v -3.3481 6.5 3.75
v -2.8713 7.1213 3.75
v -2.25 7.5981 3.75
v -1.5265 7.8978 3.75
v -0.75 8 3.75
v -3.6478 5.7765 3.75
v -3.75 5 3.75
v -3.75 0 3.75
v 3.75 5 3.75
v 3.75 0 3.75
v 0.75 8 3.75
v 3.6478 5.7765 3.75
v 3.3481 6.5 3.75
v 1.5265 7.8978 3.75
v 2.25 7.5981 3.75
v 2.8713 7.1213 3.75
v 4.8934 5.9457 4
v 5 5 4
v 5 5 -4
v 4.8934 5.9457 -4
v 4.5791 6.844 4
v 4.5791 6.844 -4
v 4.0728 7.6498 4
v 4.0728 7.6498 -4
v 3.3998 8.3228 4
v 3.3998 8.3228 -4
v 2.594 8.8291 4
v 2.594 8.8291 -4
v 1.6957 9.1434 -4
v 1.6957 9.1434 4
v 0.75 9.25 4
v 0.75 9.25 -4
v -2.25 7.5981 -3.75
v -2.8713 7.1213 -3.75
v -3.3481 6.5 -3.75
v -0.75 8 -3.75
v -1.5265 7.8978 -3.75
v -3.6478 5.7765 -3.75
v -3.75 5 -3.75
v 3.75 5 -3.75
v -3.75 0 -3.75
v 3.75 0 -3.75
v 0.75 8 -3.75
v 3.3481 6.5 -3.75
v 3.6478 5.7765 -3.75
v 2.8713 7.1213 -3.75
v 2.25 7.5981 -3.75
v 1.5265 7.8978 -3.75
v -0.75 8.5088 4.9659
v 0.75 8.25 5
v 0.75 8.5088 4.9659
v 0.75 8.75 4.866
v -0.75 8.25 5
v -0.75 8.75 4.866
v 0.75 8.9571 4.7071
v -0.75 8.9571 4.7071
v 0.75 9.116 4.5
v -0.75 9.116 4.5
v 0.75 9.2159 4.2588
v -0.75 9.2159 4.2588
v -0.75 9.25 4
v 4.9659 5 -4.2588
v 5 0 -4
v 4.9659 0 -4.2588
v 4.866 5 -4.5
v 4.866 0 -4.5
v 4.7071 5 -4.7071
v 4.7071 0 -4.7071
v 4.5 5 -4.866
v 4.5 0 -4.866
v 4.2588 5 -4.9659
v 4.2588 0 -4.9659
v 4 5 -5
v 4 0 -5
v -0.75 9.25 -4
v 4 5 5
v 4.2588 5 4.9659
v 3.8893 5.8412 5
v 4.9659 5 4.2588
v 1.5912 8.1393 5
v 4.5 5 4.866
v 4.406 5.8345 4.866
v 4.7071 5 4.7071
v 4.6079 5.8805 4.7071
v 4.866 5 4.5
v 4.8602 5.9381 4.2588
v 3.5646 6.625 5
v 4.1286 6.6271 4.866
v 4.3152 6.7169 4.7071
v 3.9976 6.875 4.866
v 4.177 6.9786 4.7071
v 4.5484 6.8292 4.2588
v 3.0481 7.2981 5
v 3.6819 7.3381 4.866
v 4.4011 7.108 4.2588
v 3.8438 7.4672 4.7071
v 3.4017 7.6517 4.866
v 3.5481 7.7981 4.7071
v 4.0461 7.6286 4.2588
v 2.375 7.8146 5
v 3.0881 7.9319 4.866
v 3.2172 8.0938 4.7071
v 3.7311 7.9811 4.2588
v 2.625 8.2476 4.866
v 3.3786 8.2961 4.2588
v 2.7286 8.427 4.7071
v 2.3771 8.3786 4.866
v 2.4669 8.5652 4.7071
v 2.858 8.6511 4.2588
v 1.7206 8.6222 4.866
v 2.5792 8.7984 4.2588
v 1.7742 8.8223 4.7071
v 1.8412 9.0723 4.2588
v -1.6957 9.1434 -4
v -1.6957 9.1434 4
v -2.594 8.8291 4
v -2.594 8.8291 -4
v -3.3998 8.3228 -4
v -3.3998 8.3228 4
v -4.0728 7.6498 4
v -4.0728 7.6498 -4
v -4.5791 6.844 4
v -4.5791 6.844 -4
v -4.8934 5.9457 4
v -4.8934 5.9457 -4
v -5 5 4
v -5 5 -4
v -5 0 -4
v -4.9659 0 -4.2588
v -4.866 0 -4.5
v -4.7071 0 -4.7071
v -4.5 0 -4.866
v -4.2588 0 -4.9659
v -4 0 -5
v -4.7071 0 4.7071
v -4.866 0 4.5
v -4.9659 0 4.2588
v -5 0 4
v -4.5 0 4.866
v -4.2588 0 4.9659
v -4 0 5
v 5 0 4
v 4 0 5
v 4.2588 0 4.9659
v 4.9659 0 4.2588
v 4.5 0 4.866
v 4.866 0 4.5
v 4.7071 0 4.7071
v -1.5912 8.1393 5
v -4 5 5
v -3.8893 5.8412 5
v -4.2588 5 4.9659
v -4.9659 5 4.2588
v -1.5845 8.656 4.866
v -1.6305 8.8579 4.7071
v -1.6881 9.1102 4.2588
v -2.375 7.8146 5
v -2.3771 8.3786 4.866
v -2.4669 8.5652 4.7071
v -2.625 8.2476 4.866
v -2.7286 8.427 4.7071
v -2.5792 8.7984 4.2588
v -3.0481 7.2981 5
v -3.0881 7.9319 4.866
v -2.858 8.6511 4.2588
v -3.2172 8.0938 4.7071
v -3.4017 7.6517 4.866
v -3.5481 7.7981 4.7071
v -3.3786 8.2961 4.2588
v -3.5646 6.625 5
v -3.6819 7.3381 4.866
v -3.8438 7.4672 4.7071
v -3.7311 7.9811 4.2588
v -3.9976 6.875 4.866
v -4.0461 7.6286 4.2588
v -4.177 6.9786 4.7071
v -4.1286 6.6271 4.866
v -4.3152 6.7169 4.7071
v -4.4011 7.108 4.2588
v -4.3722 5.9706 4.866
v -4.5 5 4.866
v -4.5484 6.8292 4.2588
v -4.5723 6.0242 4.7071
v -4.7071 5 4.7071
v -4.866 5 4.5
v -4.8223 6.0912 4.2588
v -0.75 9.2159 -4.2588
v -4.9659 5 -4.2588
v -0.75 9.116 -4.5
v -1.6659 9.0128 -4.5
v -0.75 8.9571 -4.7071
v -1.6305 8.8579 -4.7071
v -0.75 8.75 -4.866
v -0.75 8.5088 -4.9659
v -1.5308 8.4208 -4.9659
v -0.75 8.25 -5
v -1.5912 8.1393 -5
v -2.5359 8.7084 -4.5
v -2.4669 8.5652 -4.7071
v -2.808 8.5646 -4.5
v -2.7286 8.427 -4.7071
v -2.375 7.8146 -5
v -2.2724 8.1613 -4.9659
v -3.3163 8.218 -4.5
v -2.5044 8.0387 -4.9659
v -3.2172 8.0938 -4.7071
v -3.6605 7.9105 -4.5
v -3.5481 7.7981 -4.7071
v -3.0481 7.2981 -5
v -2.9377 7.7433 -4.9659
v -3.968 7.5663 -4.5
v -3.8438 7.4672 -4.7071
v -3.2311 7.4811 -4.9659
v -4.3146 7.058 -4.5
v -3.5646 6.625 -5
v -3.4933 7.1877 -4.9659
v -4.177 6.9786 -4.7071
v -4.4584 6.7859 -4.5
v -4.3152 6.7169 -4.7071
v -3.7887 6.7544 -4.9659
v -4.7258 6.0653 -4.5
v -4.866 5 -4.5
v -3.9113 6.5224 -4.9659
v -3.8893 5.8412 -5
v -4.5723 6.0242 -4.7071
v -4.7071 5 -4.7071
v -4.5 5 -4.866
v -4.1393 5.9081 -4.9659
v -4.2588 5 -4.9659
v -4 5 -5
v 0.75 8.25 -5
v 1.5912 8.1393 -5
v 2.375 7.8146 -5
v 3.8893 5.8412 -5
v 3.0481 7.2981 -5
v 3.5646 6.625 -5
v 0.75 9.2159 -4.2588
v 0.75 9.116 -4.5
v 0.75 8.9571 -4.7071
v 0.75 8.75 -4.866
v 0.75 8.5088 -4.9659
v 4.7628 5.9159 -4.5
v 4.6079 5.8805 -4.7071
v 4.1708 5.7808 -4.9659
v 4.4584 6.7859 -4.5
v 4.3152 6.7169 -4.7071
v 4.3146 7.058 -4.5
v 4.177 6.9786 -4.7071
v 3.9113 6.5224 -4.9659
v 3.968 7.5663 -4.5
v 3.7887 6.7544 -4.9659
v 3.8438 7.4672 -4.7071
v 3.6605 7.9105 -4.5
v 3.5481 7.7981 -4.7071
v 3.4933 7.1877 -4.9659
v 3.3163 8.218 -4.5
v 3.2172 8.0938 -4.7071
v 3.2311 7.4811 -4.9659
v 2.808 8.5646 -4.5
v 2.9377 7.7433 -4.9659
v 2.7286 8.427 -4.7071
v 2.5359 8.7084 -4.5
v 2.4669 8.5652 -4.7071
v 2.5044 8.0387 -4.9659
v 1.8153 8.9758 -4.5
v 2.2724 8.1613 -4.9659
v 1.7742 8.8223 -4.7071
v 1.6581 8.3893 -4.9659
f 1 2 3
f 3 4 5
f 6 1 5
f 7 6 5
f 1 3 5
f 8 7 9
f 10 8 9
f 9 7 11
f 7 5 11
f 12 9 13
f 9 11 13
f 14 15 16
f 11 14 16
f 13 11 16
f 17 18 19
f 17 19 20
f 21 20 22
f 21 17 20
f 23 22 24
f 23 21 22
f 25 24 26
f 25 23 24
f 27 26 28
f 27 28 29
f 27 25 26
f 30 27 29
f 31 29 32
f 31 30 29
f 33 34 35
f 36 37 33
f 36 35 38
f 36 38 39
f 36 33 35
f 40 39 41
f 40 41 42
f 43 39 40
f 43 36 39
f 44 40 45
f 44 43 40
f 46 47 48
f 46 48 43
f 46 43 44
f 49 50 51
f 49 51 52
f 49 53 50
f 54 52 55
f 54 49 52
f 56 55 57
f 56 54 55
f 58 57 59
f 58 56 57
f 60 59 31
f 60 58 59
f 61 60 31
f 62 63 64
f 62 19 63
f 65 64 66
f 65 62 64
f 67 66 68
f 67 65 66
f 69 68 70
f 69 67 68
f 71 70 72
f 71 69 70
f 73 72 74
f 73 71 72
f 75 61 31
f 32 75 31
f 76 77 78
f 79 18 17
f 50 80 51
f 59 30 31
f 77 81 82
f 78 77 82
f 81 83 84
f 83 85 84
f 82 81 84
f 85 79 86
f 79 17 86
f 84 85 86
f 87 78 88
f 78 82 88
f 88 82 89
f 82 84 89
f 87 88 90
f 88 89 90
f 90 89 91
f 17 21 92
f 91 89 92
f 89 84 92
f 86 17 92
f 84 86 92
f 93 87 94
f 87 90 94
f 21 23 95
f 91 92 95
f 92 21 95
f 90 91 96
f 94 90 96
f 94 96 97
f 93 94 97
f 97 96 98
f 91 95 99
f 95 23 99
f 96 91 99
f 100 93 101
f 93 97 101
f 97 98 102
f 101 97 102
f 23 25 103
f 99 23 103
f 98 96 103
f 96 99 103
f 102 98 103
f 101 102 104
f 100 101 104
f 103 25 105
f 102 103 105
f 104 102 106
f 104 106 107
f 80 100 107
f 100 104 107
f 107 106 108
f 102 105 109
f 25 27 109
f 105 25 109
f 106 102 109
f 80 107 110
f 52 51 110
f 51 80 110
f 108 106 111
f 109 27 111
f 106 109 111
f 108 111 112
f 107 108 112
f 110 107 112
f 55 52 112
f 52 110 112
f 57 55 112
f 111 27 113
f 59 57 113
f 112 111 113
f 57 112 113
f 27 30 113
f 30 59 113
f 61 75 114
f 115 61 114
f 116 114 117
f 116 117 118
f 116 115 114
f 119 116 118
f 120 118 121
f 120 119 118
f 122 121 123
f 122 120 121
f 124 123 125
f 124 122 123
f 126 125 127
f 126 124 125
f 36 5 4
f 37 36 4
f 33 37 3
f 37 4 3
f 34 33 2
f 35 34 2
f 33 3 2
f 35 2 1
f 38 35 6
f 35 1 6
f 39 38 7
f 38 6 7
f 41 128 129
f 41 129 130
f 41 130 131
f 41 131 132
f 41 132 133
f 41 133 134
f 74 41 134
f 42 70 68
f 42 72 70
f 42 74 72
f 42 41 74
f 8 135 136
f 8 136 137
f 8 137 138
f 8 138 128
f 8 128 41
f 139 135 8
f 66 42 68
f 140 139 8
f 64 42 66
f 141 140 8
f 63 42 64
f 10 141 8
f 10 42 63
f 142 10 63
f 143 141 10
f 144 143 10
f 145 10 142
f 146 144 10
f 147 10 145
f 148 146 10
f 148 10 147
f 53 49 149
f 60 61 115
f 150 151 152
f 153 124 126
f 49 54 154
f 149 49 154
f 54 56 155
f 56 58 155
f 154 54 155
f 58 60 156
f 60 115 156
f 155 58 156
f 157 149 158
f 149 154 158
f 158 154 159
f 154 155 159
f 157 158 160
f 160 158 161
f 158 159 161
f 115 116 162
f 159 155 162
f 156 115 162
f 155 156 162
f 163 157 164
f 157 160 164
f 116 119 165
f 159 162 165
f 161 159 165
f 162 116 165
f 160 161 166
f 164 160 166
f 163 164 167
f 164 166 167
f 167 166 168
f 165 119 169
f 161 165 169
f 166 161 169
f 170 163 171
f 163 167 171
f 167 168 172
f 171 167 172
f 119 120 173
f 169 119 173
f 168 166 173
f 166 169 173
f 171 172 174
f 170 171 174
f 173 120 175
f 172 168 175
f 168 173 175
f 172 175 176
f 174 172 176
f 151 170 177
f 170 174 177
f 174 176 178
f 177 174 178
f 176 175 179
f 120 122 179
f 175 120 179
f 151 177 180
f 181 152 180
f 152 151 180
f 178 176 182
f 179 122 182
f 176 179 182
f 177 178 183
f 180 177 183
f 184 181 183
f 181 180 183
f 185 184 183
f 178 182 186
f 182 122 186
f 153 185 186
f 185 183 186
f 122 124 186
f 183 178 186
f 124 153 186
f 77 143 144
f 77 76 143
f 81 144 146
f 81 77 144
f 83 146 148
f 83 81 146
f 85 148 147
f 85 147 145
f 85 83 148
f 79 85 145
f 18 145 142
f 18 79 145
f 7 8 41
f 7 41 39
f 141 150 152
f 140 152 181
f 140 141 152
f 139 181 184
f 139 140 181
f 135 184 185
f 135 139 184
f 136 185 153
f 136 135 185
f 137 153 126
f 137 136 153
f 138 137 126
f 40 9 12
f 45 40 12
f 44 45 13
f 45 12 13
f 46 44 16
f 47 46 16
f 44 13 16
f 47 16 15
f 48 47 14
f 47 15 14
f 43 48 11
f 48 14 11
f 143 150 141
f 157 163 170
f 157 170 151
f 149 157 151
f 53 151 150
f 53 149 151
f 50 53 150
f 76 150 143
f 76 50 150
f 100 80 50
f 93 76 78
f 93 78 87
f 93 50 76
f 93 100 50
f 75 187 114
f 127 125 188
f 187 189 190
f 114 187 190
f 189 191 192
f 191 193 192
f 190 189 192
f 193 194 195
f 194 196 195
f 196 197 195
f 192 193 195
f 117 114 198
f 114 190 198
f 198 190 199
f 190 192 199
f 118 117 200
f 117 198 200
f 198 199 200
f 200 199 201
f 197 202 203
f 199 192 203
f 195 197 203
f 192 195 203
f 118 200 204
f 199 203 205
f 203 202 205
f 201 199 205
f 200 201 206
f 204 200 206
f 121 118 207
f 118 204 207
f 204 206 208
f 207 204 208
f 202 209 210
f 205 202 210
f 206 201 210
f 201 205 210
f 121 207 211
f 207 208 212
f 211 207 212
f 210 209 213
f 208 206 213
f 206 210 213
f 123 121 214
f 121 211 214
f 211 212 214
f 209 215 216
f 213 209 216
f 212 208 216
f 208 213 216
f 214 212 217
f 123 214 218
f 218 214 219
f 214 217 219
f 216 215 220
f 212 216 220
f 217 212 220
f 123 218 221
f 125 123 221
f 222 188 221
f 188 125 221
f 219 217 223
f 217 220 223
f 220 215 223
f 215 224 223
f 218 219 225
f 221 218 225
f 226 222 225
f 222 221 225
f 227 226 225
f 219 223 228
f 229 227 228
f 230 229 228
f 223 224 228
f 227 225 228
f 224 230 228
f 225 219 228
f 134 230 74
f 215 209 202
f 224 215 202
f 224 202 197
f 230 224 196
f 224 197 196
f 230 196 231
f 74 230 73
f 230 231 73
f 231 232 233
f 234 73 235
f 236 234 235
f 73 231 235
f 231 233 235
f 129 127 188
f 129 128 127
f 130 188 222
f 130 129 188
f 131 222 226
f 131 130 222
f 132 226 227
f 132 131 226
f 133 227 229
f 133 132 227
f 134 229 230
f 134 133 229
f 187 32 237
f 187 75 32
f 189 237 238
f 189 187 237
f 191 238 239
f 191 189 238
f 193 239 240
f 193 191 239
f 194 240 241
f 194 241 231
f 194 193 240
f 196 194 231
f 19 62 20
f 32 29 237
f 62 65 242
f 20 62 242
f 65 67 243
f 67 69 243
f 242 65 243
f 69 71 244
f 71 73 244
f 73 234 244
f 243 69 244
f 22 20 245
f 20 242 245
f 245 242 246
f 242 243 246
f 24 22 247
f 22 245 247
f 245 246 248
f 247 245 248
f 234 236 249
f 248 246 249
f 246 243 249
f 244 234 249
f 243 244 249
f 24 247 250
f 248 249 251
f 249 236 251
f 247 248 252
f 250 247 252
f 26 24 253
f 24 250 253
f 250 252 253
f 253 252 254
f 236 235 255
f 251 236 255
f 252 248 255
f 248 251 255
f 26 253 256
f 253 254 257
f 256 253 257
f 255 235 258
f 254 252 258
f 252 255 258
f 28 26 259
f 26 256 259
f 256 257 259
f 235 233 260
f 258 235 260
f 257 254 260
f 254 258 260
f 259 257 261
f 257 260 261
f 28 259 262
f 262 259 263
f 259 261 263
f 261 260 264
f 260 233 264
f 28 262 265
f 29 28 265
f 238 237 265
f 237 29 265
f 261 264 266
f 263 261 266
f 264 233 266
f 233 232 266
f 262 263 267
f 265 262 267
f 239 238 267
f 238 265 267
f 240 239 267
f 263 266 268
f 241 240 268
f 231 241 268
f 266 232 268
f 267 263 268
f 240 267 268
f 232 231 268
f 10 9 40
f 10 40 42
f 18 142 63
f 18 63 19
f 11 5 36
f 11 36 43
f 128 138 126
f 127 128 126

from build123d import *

# Parameters (mm, degrees)
PAD_DEPTH    = 3.75
PAD001_DEPTH = 1.25
FILLET_R     = 1


with BuildPart() as part:
    # Sketch → Pad (new body, symmetric)
    with BuildSketch(Plane.XY):
        with BuildLine():
            Line((-5, 0), (-3.75, 0))
            Line((-3.75, 0), (-3.75, 5))
            ThreePointArc((-0.75, 8), (-2.87132, 7.12132), (-3.75, 5))
            Line((-0.75, 8), (0.75, 8))
            ThreePointArc((3.75, 5), (2.87132, 7.12132), (0.75, 8))
            Line((3.75, 5), (3.75, 0))
            Line((3.75, 0), (5, 0))
            Line((5, 0), (5, 5))
            ThreePointArc((5, 5), (3.755204, 8.005204), (0.75, 9.25))
            Line((-0.75, 9.25), (0.75, 9.25))
            ThreePointArc((-0.75, 9.25), (-3.755204, 8.005204), (-5, 5))
            Line((-5, 0), (-5, 5))
        make_face()
    extrude(amount=PAD_DEPTH, both=True)

    # Sketch001 (on Face14 of Pad) → Pad001 (join)
    with BuildSketch(Plane.XY.offset(3.75)):
        with BuildLine():
            Line((-5, 0), (-3.75, 0))
            Line((-3.75, 0), (3.75, 0))
            Line((3.75, 0), (5, 0))
            Line((5, 0), (5, 5))
            ThreePointArc((5, 5), (3.755204, 8.005204), (0.75, 9.25))
            Line((-0.75, 9.25), (0.75, 9.25))
            ThreePointArc((-0.75, 9.25), (-3.755204, 8.005204), (-5, 5))
            Line((-5, 0), (-5, 5))
        make_face()
    pad001 = extrude(amount=PAD001_DEPTH)

    # Mirrored: Pad001 across XY
    add(pad001.mirror(Plane.XY))

    # Fillet
    fillet_edges = [part.edges().sort_by_distance(p)[0] for p in [
        (5, 2.5, 5),
        (5, 2.5, -5),
    ]]
    fillet(fillet_edges, radius=FILLET_R)


solid = part.part
